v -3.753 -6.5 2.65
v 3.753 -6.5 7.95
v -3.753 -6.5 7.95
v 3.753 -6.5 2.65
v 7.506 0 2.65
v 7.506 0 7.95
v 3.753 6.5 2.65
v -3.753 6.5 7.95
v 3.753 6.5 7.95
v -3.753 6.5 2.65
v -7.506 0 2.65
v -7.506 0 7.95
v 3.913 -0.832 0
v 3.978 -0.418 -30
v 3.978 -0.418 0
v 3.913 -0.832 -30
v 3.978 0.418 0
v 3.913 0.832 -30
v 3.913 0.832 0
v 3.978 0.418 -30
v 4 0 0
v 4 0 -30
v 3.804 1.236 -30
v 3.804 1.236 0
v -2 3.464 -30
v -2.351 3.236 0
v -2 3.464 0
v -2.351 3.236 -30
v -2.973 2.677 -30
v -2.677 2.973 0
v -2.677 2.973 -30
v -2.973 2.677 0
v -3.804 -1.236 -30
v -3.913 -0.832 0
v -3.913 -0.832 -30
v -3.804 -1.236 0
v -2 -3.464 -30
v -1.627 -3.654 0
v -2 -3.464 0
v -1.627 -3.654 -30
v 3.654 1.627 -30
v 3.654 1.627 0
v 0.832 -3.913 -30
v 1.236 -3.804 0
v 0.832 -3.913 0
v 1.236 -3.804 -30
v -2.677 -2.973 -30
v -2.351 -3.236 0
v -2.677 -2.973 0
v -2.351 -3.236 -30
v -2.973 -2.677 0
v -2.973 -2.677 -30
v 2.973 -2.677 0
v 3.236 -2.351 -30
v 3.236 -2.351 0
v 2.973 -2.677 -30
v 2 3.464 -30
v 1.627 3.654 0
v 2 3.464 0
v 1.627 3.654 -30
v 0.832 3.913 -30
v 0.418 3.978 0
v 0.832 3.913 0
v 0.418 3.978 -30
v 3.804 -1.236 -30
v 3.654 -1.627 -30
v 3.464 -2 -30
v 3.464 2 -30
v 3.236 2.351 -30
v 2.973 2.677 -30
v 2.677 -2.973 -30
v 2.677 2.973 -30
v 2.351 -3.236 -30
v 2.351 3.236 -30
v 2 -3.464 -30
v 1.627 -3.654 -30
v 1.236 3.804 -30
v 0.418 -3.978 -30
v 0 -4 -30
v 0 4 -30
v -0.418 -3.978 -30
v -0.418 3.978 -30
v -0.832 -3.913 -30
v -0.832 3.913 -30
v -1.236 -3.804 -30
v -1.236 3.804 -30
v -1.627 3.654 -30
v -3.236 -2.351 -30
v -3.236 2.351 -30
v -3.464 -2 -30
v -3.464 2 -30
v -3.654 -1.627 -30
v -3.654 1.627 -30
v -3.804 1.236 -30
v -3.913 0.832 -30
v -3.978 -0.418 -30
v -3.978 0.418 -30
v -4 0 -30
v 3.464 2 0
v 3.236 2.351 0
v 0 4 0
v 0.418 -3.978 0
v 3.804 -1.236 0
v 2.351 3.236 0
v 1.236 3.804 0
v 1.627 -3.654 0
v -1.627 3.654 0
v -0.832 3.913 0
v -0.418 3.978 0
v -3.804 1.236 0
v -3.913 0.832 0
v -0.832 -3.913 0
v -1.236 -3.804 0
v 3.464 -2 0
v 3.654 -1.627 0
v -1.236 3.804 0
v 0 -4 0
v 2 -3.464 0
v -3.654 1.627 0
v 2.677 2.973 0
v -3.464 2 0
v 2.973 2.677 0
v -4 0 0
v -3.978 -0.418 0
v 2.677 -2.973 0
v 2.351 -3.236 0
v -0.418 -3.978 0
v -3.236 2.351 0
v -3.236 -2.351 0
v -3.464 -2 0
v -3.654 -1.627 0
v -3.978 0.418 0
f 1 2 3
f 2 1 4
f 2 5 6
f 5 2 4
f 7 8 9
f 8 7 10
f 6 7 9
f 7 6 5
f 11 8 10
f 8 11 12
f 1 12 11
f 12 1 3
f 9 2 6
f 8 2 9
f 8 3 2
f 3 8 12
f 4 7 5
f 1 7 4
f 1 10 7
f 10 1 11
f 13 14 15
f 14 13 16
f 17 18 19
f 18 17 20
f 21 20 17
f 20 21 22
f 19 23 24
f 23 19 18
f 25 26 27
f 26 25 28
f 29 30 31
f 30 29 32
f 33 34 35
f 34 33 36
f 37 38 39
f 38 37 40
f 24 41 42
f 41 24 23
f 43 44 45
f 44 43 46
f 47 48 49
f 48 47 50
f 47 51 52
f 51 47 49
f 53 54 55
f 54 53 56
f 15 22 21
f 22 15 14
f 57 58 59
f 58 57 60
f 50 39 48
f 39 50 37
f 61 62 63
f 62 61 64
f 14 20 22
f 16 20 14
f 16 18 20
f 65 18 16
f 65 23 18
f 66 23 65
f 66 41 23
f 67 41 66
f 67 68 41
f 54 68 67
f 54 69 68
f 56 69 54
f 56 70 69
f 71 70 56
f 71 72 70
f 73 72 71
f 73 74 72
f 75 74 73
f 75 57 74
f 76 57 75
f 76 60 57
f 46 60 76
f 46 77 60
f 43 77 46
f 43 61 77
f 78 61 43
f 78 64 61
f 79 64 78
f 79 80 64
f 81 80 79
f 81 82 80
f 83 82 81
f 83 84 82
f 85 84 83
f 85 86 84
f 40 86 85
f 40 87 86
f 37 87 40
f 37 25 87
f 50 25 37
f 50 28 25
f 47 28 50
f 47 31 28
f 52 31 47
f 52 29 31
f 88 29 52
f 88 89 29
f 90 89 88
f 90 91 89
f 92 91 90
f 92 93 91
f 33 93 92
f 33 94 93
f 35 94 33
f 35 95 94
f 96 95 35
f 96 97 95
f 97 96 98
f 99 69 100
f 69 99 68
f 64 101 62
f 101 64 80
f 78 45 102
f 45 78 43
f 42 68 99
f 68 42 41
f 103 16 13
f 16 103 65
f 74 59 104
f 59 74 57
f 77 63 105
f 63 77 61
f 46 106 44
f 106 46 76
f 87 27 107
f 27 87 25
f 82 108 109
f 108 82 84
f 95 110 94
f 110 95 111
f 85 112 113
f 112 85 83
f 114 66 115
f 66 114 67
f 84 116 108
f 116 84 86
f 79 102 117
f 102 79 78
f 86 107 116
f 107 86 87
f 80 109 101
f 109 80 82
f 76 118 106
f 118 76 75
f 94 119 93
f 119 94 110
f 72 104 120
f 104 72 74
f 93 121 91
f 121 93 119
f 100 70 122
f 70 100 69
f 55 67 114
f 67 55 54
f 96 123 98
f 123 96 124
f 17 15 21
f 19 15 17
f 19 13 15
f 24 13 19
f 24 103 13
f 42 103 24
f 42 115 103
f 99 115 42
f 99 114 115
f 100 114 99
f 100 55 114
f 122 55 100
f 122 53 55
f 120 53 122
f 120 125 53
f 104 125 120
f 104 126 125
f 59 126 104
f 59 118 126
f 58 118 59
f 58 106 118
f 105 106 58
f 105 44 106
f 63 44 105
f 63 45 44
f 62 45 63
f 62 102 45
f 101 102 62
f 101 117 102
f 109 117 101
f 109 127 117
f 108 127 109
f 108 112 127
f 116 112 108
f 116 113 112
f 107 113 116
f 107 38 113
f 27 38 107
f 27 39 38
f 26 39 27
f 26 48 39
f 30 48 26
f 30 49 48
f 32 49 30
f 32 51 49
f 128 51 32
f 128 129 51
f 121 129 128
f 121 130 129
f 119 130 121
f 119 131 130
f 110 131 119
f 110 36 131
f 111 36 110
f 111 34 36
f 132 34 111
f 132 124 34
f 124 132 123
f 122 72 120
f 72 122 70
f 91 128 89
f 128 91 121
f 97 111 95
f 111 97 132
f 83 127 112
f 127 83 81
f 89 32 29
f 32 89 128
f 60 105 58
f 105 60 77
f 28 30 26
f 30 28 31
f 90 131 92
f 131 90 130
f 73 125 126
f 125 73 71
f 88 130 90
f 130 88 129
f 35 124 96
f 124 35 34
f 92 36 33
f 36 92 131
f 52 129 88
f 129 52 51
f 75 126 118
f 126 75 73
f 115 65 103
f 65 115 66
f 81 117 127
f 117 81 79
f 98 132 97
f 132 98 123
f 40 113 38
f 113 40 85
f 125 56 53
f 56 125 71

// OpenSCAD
// M8 Hex Bolt (Thread omitted)

// Parameters
head_across_flats = 13;  // Head width across flats (mm)
head_height = 5.3;       // Head height (mm)
shank_diameter = 8;      // Shank diameter (mm)
shank_length = 30;       // Shank length (mm)
hex_sides = 6;

// Calculate hex radius (distance from center to vertex)
head_radius = head_across_flats / (2 * cos(180/hex_sides));

// Hex head (centered at z = head_height/2, bottom at z = 0)
module hex_head() {
    translate([0, 0, head_height/2])
        cylinder(h = head_height, r = head_radius, $fn = hex_sides);
}

// Shank (extends downward from bottom of head, along -Z)
module shank() {
    translate([0, 0, -shank_length])
        cylinder(h = shank_length, r = shank_diameter/2, $fn = 60);
}

// Assemble
hex_head();
shank();
